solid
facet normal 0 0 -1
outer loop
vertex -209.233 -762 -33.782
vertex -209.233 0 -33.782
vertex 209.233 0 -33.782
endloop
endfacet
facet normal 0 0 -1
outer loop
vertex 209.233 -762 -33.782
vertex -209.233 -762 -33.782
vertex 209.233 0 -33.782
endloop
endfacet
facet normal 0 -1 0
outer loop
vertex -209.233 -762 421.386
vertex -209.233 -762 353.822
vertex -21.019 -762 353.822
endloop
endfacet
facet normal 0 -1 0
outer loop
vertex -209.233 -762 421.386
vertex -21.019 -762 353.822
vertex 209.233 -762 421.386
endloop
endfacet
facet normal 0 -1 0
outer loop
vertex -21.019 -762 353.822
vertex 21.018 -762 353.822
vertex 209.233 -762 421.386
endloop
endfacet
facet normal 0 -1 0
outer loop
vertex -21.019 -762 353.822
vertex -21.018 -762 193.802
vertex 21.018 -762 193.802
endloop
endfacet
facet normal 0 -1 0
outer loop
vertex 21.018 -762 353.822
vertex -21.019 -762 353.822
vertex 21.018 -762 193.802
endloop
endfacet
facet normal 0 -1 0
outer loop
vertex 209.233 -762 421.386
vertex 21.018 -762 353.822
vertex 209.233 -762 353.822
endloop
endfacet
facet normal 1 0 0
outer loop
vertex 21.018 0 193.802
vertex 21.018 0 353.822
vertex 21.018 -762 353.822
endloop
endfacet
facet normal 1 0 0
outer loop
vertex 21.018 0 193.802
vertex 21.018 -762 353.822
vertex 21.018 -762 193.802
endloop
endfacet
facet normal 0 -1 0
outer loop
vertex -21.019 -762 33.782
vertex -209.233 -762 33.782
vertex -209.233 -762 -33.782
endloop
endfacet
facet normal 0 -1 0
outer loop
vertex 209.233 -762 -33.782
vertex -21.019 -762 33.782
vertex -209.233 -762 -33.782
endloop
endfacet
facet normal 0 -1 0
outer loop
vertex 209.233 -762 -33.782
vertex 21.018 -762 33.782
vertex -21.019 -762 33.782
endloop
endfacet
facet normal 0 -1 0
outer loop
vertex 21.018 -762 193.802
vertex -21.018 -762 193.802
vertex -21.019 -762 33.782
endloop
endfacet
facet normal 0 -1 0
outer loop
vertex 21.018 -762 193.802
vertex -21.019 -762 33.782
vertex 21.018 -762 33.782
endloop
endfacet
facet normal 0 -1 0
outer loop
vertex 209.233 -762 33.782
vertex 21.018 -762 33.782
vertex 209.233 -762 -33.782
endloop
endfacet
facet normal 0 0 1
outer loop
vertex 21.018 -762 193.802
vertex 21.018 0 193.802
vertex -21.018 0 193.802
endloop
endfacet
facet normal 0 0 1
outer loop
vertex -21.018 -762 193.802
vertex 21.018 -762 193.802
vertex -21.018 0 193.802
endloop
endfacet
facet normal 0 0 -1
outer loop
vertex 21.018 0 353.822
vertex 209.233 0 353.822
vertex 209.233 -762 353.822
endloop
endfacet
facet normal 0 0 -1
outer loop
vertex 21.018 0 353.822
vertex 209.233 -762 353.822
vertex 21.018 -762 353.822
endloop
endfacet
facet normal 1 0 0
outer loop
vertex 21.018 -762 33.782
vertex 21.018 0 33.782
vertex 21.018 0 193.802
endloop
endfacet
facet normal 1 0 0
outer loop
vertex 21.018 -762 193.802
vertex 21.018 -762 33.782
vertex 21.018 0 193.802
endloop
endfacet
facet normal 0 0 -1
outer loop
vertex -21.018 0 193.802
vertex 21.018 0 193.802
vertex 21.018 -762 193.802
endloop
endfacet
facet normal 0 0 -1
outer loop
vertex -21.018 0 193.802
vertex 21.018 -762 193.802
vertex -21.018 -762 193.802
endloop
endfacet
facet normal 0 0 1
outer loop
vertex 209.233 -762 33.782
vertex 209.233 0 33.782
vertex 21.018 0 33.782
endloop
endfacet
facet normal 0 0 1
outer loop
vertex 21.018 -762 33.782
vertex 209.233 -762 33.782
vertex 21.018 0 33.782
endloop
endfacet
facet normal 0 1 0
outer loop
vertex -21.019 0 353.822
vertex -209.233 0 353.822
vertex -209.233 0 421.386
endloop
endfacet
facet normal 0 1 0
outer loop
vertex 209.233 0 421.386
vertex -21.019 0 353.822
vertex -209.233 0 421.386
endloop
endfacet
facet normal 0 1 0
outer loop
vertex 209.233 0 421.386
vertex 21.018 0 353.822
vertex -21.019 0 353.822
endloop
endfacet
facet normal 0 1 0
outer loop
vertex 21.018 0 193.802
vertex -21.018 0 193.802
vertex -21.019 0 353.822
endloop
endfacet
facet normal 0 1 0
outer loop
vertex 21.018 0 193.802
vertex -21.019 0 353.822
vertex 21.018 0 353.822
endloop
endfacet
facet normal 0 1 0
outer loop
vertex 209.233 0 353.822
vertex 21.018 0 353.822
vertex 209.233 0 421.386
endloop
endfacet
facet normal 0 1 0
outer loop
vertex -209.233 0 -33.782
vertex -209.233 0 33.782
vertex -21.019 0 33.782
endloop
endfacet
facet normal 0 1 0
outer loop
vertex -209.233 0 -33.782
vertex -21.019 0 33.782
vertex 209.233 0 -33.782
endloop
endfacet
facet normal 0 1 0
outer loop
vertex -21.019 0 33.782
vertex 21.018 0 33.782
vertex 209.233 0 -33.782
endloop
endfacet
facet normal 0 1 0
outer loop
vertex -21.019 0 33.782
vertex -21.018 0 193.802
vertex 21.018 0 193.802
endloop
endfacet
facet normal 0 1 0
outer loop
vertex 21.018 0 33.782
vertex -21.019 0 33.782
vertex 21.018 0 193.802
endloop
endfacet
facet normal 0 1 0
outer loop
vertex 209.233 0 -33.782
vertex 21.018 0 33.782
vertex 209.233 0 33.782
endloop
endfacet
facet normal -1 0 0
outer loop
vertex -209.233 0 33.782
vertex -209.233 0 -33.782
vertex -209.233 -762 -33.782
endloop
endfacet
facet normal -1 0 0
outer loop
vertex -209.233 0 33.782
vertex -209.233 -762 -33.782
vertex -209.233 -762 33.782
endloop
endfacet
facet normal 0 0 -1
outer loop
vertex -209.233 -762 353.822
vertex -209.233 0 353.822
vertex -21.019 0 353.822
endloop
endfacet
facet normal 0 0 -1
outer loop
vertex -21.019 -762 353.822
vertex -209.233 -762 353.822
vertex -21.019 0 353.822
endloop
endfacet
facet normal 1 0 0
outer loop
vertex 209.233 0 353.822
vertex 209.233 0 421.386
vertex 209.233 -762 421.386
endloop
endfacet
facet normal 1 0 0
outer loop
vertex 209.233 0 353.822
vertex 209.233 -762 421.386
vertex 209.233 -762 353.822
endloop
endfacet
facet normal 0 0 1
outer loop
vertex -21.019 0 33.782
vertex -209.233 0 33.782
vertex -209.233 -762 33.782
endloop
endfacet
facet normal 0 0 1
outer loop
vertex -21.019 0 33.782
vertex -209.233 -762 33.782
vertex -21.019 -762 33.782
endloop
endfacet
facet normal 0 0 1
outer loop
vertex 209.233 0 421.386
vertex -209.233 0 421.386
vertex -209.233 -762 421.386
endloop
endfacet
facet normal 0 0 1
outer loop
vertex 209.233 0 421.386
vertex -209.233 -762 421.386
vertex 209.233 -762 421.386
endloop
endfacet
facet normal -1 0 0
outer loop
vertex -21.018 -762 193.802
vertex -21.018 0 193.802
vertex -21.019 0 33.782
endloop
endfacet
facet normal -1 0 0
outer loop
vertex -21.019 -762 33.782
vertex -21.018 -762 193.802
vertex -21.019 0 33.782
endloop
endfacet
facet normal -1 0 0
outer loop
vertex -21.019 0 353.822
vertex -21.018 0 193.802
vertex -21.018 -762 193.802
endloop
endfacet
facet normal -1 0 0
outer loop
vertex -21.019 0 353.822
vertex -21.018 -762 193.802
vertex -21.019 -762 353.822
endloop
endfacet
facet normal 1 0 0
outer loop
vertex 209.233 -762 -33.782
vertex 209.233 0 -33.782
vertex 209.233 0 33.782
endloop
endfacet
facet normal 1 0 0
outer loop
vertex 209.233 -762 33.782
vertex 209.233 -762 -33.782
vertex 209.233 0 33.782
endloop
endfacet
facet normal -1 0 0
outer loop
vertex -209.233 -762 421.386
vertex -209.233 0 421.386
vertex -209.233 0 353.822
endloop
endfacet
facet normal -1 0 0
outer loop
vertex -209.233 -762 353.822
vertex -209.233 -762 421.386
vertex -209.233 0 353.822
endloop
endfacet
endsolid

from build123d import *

# Parameters (mm, degrees)
F0_W     = 188.214
F0_H     = 67.564
F0_W_2   = 21.0185
F0_H_2   = 160.02
F1_DEPTH = 762


# Not quite as in the source:
# - a pattern or mirror of a feature is missing from the dataset's text; its kind, count and spacing are read off the source's solid


with BuildPart() as f1:
    # F0 (on Front) → F1 (new body)
    with BuildSketch(Plane.XZ):
        with Locations((115.1255, 0)):
            Rectangle(F0_W, F0_H)
        Polygon((21.0185, -33.782), (21.0185, 33.782), (0, 33.782), (0, 0), (0, -33.782), align=None)
        with Locations((10.50925, 113.792)):
            Rectangle(F0_W_2, F0_H_2)
        Polygon((0, 0), (0, 33.782), (-21.0185, 33.782), (-21.0185, -33.782), (0, -33.782), align=None)
        with Locations((-10.50925, 113.792)):
            Rectangle(F0_W_2, F0_H_2)
        with Locations((-115.1255, 0)):
            Rectangle(F0_W, F0_H)
    extrude(amount=F1_DEPTH)


with BuildPart() as f1_copies_1:
    # F1_copies: instance of F1
    add(f1.part.mirror(Plane.XY.offset(193.802)))


solid = Compound([f1.part, f1_copies_1.part])
